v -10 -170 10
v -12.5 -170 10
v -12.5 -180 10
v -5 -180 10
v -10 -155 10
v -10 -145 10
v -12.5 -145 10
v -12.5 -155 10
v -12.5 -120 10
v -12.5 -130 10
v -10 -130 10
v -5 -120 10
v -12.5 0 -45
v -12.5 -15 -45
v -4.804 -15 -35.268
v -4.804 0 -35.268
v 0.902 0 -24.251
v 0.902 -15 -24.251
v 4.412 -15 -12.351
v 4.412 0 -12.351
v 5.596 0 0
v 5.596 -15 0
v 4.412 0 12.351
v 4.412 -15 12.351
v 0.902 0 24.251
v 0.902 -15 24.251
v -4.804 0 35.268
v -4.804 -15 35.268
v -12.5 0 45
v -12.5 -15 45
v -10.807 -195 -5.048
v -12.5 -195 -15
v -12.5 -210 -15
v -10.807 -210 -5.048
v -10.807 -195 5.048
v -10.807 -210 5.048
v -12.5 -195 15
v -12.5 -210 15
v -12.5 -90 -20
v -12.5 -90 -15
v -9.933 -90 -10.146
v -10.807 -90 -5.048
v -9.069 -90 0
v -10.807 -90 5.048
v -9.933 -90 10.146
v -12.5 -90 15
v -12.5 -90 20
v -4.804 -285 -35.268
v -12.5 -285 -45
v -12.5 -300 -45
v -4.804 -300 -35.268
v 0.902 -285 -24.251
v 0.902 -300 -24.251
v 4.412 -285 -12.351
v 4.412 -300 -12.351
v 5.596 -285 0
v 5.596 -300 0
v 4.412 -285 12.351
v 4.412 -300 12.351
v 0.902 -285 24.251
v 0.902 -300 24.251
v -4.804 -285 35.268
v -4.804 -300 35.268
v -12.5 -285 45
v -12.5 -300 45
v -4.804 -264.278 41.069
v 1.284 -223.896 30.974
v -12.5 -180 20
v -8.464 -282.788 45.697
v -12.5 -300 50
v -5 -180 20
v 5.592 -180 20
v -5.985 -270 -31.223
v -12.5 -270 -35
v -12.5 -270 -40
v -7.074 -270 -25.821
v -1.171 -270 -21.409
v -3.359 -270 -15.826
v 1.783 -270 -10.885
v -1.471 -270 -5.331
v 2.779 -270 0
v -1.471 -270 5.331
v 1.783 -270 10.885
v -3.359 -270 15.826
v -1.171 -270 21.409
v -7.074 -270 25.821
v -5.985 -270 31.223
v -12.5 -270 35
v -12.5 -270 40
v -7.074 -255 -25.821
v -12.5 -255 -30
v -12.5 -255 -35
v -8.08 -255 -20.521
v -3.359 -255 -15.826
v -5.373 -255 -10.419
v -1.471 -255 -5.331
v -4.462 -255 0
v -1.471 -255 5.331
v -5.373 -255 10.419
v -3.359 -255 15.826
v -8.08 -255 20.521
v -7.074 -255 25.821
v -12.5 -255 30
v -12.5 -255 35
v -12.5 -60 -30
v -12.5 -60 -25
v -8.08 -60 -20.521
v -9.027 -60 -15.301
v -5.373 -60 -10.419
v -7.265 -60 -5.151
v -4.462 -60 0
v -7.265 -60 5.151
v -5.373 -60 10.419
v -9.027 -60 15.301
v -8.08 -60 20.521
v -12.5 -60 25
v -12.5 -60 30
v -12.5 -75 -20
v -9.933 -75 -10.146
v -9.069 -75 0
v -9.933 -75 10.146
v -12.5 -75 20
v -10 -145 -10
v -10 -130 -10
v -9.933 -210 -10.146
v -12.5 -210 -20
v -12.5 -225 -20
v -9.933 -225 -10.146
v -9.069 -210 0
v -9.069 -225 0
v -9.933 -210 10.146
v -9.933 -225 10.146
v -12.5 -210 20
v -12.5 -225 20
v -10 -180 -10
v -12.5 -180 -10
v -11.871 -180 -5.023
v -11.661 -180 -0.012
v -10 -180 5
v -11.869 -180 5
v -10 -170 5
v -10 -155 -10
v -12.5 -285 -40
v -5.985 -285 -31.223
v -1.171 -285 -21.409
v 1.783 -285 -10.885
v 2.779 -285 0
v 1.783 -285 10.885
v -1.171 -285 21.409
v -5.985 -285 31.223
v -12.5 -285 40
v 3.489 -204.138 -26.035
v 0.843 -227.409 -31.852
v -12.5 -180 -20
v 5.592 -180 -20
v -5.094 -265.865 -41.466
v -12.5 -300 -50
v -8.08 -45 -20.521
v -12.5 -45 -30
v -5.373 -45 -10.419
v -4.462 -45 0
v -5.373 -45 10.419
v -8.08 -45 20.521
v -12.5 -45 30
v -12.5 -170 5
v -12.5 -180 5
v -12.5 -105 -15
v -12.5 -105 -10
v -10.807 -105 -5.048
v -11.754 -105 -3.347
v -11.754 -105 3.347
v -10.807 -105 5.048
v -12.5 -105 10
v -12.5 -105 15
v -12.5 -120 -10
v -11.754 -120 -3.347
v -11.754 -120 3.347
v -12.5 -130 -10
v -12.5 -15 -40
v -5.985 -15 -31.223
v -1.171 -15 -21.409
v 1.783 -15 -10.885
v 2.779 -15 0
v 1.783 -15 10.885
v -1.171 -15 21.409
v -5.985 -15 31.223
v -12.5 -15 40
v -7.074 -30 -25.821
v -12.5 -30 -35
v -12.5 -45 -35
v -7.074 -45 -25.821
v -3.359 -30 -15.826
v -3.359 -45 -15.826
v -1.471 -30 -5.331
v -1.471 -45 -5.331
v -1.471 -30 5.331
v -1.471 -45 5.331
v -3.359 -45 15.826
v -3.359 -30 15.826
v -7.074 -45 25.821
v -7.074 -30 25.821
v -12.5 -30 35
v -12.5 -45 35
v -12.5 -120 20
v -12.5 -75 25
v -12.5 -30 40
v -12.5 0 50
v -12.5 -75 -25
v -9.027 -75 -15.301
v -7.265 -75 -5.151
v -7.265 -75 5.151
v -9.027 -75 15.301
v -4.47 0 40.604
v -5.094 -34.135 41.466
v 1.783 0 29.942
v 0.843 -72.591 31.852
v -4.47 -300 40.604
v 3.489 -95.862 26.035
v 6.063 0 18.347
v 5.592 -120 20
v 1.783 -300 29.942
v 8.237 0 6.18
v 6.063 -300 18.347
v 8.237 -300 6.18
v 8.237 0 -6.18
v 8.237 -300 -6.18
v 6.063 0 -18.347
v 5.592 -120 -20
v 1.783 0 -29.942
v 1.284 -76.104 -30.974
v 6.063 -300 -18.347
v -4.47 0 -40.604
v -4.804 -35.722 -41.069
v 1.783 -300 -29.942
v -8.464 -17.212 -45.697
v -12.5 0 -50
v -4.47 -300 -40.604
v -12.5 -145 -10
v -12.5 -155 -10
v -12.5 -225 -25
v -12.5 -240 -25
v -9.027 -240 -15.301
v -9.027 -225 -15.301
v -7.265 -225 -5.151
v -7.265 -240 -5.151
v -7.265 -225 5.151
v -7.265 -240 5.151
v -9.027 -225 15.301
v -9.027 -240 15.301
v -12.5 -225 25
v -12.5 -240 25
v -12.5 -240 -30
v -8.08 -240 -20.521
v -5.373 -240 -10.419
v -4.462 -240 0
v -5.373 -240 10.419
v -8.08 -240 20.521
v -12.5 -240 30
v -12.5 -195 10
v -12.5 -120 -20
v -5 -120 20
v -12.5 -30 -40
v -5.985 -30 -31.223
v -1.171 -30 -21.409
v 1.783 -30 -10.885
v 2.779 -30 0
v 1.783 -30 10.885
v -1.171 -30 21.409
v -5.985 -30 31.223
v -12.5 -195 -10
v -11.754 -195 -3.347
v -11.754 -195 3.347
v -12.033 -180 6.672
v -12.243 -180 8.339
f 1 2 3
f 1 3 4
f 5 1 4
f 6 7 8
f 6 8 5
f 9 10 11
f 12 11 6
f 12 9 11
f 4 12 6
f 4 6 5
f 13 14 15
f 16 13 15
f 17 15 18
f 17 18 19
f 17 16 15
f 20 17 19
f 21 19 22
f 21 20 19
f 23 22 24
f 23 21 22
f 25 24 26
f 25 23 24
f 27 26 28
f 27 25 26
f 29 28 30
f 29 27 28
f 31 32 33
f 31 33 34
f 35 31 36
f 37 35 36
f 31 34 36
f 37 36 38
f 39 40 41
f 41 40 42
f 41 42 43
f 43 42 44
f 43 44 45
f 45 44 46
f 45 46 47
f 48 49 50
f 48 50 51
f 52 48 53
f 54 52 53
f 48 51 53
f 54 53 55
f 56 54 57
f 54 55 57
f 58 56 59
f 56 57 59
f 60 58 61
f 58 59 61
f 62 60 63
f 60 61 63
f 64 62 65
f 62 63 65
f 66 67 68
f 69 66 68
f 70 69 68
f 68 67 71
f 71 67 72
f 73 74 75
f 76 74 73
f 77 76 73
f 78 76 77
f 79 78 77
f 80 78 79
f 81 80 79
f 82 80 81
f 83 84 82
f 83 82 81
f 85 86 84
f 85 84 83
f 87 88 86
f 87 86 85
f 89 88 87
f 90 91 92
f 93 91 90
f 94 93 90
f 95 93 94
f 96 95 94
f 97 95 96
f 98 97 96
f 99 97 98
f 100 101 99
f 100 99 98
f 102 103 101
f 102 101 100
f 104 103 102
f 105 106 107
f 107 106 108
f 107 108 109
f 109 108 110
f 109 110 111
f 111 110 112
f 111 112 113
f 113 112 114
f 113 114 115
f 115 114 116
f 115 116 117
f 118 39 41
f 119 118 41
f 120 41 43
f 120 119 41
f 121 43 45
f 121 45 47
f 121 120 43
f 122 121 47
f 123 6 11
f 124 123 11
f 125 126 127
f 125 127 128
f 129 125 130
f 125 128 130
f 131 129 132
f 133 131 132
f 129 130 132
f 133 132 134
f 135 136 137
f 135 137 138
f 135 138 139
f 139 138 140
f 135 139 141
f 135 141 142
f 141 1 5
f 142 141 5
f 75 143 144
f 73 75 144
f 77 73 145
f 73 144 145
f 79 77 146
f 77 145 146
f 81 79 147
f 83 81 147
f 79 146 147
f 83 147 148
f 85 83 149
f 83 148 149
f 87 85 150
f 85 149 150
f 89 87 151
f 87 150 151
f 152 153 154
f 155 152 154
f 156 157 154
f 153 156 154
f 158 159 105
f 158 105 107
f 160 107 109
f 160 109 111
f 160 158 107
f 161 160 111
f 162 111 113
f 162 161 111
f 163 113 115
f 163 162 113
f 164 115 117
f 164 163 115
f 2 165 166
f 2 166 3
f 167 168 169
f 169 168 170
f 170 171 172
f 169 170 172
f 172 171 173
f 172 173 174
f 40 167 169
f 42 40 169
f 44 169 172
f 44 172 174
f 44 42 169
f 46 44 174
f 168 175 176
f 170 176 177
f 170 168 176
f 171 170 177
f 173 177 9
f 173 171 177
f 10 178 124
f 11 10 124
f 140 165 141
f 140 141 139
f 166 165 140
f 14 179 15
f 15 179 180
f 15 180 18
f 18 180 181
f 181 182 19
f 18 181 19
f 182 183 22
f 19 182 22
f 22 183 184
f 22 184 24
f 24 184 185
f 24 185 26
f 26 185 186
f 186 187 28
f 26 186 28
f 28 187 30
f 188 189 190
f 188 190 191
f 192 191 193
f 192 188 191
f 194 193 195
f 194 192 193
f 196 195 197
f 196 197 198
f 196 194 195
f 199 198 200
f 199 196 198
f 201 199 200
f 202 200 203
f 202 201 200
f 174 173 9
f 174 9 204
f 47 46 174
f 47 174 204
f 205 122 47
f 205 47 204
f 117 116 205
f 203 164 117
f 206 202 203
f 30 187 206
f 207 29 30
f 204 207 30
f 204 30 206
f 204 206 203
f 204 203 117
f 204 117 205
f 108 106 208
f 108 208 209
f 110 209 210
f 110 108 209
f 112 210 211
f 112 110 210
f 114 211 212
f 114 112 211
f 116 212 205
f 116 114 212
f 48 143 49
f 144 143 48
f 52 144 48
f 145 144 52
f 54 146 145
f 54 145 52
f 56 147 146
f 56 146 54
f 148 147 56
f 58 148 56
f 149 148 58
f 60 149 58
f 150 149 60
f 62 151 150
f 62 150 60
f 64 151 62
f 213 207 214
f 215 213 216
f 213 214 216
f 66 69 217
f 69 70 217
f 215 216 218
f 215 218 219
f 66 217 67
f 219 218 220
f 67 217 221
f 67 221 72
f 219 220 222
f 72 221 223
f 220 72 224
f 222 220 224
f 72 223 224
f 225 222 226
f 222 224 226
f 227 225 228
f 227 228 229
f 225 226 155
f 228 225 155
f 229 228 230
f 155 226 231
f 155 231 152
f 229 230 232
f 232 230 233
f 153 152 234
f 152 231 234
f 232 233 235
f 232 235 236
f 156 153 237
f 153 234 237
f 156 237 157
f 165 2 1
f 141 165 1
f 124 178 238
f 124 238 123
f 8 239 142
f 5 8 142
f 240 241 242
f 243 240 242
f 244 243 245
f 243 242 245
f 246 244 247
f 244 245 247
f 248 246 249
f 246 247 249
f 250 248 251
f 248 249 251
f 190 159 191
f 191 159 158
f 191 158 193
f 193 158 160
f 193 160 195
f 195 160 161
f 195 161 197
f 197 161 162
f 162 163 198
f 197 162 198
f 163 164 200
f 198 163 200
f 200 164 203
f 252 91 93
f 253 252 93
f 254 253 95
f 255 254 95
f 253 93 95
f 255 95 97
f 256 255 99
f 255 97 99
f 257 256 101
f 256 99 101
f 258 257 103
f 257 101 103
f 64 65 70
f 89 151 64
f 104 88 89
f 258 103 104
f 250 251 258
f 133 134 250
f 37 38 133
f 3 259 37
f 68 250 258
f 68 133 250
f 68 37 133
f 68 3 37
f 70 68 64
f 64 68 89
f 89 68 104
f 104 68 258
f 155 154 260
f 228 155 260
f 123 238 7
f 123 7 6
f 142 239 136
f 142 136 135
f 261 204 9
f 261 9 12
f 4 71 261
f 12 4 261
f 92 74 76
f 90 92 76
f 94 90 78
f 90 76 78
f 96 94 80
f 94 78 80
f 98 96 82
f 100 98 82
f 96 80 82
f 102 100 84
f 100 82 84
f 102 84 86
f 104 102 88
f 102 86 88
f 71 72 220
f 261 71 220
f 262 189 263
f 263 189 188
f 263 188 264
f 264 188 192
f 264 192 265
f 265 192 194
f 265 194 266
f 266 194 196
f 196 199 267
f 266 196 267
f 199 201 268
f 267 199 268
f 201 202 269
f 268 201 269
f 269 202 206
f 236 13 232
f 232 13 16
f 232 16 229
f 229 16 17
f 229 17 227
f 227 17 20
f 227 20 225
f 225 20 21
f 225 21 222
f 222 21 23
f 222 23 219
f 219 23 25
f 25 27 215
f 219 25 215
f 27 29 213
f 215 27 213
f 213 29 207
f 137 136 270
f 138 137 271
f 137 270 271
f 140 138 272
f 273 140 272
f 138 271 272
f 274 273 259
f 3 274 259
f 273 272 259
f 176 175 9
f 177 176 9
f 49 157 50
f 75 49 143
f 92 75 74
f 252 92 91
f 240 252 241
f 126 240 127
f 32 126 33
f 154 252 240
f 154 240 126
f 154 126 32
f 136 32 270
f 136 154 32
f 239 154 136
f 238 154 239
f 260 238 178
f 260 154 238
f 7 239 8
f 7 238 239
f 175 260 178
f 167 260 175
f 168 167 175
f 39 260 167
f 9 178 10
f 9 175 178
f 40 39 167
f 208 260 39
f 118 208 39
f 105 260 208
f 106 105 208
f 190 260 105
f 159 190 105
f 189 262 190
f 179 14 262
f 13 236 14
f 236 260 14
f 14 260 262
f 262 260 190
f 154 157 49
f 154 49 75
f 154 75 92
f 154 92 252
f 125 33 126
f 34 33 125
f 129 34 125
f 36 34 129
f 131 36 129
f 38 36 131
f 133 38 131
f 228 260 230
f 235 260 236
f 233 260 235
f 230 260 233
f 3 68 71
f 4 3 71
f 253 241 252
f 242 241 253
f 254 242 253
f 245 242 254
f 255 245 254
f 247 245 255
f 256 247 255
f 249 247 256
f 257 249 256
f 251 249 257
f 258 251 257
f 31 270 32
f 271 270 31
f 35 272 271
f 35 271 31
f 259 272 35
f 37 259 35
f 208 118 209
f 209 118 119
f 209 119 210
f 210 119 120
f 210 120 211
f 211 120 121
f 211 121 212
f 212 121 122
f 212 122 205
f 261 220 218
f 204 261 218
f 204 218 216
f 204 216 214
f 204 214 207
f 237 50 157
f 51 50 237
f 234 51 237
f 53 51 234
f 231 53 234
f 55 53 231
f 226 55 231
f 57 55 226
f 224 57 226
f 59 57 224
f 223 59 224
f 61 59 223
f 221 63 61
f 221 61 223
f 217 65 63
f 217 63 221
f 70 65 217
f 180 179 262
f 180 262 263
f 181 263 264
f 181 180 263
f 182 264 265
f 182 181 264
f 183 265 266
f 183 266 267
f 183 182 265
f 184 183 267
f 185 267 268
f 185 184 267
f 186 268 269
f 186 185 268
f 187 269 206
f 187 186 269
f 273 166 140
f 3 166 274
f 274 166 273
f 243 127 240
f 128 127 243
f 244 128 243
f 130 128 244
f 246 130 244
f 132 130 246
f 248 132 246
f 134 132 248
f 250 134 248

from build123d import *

# Parameters (mm, degrees)
F0_W      = 25
F0_H      = 100
F1_DEPTH  = 300
F3_DEPTH  = 80
F5_DEPTH  = 80
F7_DEPTH  = 15
F9_DEPTH  = 15
F11_DEPTH = 15
F13_DEPTH = 15
F15_DEPTH = 15
F17_DEPTH = 15
F19_DEPTH = 15
F21_DEPTH = 15
F23_DEPTH = 300
F24_W     = 7.5
F24_H     = 60
F25_DEPTH = 10
F26_W     = 2.5
F26_H     = 15
F27_DEPTH = 20
F28_W     = 10
F28_H     = 15
F29_DEPTH = 2.5


# Not quite as in the source:
# - a pattern or mirror of a feature is missing from the dataset's text; its kind, count and spacing are read off the source's solid


with BuildPart() as f1:
    # F0 (on Front) → F1 (new body)
    with BuildSketch(Plane.XZ):
        Rectangle(F0_W, F0_H)
    extrude(amount=F1_DEPTH)

    # F2 (on face) → F3 (cut)
    with BuildSketch(Plane.YZ.offset(12.5)):
        Polygon((-180, 20), (-120, 20), (0, 50), (-300, 50), align=None)
    extrude(amount=-F3_DEPTH, mode=Mode.SUBTRACT)

    # F4 (on face) → F5 (cut)
    with BuildSketch(Plane(origin=(-12.5, 0, 0), x_dir=(0, -1, 0), z_dir=(-1, 0, 0))):
        Polygon((180, -20), (120, -20), (0, -50), (300, -50), align=None)
    extrude(amount=-F5_DEPTH, mode=Mode.SUBTRACT)

    # F6 (on face) → F7 (cut)
    with BuildSketch(Plane.XZ.offset(300)):
        with BuildLine():
            Line((-12.5, 45), (-12.5, -45))
            ThreePointArc((-12.5, -45), (5.5958424018, 0), (-12.5, 45))
        make_face()
    f7 = extrude(amount=-F7_DEPTH, mode=Mode.SUBTRACT)

    # F7_copies: F7 across plane
    add(f7.mirror(Plane.ZX.offset(-150)), mode=Mode.SUBTRACT)

    # F8 (on face) → F9 (cut)
    with BuildSketch(Plane.XZ.offset(285)):
        with BuildLine():
            Line((-12.5, 40), (-12.5, -40))
            ThreePointArc((-12.5, -40), (2.77864045, 0), (-12.5, 40))
        make_face()
    f9 = extrude(amount=-F9_DEPTH, mode=Mode.SUBTRACT)

    # F9_copies: F9 across plane
    add(f9.mirror(Plane.ZX.offset(-150)), mode=Mode.SUBTRACT)

    # F10 (on face) → F11 (cut)
    with BuildSketch(Plane.XZ.offset(270)):
        with BuildLine():
            Line((-12.5, 35), (-12.5, -35))
            ThreePointArc((-12.5, -35), (-1.233971724, 0), (-12.5, 35))
        make_face()
    f11 = extrude(amount=-F11_DEPTH, mode=Mode.SUBTRACT)

    # F11_copies: F11 across plane
    add(f11.mirror(Plane.ZX.offset(-150)), mode=Mode.SUBTRACT)

    # F12 (on face) → F13 (cut)
    with BuildSketch(Plane.XZ.offset(255)):
        with BuildLine():
            Line((-12.5, 30), (-12.5, -30))
            ThreePointArc((-12.5, -30), (-4.4615242271, 0), (-12.5, 30))
        make_face()
    f13 = extrude(amount=-F13_DEPTH, mode=Mode.SUBTRACT)

    # F13_copies: F13 across plane
    add(f13.mirror(Plane.ZX.offset(-150)), mode=Mode.SUBTRACT)

    # F14 (on face) → F15 (cut)
    with BuildSketch(Plane.XZ.offset(240)):
        with BuildLine():
            Line((-12.5, 25), (-12.5, -25))
            ThreePointArc((-12.5, -25), (-7.0435605732, 0), (-12.5, 25))
        make_face()
    f15 = extrude(amount=-F15_DEPTH, mode=Mode.SUBTRACT)

    # F15_copies: F15 across plane
    add(f15.mirror(Plane.ZX.offset(-150)), mode=Mode.SUBTRACT)

    # F16 (on face) → F17 (cut)
    with BuildSketch(Plane.XZ.offset(225)):
        with BuildLine():
            Line((-12.5, 20), (-12.5, -20))
            ThreePointArc((-12.5, -20), (-9.0685424949, 0), (-12.5, 20))
        make_face()
    f17 = extrude(amount=-F17_DEPTH, mode=Mode.SUBTRACT)

    # F17_copies: F17 across plane
    add(f17.mirror(Plane.ZX.offset(-150)), mode=Mode.SUBTRACT)

    # F18 (on face) → F19 (cut)
    with BuildSketch(Plane.XZ.offset(210)):
        with BuildLine():
            Line((-12.5, 15), (-12.5, -15))
            ThreePointArc((-12.5, -15), (-10.5947501931, 0), (-12.5, 15))
        make_face()
    f19 = extrude(amount=-F19_DEPTH, mode=Mode.SUBTRACT)

    # F19_copies: F19 across plane
    add(f19.mirror(Plane.ZX.offset(-150)), mode=Mode.SUBTRACT)

    # F20 (on face) → F21 (cut)
    with BuildSketch(Plane.XZ.offset(195)):
        with BuildLine():
            Line((-12.5, 10), (-12.5, -10))
            ThreePointArc((-12.5, -10), (-11.660797831, 0), (-12.5, 10))
        make_face()
    f21 = extrude(amount=-F21_DEPTH, mode=Mode.SUBTRACT)

    # F21_copies: F21 across plane
    add(f21.mirror(Plane.ZX.offset(-150)), mode=Mode.SUBTRACT)

    # F22 (on face) → F23 (cut)
    with BuildSketch(Plane.XZ.offset(300)):
        with BuildLine():
            Line((12.5, 50), (-12.5, 50))
            ThreePointArc((-12.5, 50), (8.5102051443, 0), (-12.5, -50))
            Line((-12.5, -50), (12.5, -50))
            Line((12.5, -50), (12.5, 50))
        make_face()
    extrude(amount=-F23_DEPTH, mode=Mode.SUBTRACT)

    # F24 (on face) → F25 (cut)
    with BuildSketch(Plane.XY.offset(20)):
        with Locations((-8.75, -150)):
            Rectangle(F24_W, F24_H)
    extrude(amount=-F25_DEPTH, mode=Mode.SUBTRACT)

    # F26 (on face) → F27 (cut)
    with BuildSketch(Plane.XY.offset(10)):
        with Locations((-11.25, -162.5)):
            Rectangle(F26_W, F26_H)
        with Locations((-11.25, -137.5)):
            Rectangle(F26_W, F26_H)
    extrude(amount=-F27_DEPTH, mode=Mode.SUBTRACT)

    # F28 (on face) → F29 (cut)
    with BuildSketch(Plane(origin=(-12.5, 0, 0), x_dir=(0, -1, 0), z_dir=(-1, 0, 0))):
        with Locations((175, -2.5)):
            Rectangle(F28_W, F28_H)
    extrude(amount=-F29_DEPTH, mode=Mode.SUBTRACT)


solid = f1.part
